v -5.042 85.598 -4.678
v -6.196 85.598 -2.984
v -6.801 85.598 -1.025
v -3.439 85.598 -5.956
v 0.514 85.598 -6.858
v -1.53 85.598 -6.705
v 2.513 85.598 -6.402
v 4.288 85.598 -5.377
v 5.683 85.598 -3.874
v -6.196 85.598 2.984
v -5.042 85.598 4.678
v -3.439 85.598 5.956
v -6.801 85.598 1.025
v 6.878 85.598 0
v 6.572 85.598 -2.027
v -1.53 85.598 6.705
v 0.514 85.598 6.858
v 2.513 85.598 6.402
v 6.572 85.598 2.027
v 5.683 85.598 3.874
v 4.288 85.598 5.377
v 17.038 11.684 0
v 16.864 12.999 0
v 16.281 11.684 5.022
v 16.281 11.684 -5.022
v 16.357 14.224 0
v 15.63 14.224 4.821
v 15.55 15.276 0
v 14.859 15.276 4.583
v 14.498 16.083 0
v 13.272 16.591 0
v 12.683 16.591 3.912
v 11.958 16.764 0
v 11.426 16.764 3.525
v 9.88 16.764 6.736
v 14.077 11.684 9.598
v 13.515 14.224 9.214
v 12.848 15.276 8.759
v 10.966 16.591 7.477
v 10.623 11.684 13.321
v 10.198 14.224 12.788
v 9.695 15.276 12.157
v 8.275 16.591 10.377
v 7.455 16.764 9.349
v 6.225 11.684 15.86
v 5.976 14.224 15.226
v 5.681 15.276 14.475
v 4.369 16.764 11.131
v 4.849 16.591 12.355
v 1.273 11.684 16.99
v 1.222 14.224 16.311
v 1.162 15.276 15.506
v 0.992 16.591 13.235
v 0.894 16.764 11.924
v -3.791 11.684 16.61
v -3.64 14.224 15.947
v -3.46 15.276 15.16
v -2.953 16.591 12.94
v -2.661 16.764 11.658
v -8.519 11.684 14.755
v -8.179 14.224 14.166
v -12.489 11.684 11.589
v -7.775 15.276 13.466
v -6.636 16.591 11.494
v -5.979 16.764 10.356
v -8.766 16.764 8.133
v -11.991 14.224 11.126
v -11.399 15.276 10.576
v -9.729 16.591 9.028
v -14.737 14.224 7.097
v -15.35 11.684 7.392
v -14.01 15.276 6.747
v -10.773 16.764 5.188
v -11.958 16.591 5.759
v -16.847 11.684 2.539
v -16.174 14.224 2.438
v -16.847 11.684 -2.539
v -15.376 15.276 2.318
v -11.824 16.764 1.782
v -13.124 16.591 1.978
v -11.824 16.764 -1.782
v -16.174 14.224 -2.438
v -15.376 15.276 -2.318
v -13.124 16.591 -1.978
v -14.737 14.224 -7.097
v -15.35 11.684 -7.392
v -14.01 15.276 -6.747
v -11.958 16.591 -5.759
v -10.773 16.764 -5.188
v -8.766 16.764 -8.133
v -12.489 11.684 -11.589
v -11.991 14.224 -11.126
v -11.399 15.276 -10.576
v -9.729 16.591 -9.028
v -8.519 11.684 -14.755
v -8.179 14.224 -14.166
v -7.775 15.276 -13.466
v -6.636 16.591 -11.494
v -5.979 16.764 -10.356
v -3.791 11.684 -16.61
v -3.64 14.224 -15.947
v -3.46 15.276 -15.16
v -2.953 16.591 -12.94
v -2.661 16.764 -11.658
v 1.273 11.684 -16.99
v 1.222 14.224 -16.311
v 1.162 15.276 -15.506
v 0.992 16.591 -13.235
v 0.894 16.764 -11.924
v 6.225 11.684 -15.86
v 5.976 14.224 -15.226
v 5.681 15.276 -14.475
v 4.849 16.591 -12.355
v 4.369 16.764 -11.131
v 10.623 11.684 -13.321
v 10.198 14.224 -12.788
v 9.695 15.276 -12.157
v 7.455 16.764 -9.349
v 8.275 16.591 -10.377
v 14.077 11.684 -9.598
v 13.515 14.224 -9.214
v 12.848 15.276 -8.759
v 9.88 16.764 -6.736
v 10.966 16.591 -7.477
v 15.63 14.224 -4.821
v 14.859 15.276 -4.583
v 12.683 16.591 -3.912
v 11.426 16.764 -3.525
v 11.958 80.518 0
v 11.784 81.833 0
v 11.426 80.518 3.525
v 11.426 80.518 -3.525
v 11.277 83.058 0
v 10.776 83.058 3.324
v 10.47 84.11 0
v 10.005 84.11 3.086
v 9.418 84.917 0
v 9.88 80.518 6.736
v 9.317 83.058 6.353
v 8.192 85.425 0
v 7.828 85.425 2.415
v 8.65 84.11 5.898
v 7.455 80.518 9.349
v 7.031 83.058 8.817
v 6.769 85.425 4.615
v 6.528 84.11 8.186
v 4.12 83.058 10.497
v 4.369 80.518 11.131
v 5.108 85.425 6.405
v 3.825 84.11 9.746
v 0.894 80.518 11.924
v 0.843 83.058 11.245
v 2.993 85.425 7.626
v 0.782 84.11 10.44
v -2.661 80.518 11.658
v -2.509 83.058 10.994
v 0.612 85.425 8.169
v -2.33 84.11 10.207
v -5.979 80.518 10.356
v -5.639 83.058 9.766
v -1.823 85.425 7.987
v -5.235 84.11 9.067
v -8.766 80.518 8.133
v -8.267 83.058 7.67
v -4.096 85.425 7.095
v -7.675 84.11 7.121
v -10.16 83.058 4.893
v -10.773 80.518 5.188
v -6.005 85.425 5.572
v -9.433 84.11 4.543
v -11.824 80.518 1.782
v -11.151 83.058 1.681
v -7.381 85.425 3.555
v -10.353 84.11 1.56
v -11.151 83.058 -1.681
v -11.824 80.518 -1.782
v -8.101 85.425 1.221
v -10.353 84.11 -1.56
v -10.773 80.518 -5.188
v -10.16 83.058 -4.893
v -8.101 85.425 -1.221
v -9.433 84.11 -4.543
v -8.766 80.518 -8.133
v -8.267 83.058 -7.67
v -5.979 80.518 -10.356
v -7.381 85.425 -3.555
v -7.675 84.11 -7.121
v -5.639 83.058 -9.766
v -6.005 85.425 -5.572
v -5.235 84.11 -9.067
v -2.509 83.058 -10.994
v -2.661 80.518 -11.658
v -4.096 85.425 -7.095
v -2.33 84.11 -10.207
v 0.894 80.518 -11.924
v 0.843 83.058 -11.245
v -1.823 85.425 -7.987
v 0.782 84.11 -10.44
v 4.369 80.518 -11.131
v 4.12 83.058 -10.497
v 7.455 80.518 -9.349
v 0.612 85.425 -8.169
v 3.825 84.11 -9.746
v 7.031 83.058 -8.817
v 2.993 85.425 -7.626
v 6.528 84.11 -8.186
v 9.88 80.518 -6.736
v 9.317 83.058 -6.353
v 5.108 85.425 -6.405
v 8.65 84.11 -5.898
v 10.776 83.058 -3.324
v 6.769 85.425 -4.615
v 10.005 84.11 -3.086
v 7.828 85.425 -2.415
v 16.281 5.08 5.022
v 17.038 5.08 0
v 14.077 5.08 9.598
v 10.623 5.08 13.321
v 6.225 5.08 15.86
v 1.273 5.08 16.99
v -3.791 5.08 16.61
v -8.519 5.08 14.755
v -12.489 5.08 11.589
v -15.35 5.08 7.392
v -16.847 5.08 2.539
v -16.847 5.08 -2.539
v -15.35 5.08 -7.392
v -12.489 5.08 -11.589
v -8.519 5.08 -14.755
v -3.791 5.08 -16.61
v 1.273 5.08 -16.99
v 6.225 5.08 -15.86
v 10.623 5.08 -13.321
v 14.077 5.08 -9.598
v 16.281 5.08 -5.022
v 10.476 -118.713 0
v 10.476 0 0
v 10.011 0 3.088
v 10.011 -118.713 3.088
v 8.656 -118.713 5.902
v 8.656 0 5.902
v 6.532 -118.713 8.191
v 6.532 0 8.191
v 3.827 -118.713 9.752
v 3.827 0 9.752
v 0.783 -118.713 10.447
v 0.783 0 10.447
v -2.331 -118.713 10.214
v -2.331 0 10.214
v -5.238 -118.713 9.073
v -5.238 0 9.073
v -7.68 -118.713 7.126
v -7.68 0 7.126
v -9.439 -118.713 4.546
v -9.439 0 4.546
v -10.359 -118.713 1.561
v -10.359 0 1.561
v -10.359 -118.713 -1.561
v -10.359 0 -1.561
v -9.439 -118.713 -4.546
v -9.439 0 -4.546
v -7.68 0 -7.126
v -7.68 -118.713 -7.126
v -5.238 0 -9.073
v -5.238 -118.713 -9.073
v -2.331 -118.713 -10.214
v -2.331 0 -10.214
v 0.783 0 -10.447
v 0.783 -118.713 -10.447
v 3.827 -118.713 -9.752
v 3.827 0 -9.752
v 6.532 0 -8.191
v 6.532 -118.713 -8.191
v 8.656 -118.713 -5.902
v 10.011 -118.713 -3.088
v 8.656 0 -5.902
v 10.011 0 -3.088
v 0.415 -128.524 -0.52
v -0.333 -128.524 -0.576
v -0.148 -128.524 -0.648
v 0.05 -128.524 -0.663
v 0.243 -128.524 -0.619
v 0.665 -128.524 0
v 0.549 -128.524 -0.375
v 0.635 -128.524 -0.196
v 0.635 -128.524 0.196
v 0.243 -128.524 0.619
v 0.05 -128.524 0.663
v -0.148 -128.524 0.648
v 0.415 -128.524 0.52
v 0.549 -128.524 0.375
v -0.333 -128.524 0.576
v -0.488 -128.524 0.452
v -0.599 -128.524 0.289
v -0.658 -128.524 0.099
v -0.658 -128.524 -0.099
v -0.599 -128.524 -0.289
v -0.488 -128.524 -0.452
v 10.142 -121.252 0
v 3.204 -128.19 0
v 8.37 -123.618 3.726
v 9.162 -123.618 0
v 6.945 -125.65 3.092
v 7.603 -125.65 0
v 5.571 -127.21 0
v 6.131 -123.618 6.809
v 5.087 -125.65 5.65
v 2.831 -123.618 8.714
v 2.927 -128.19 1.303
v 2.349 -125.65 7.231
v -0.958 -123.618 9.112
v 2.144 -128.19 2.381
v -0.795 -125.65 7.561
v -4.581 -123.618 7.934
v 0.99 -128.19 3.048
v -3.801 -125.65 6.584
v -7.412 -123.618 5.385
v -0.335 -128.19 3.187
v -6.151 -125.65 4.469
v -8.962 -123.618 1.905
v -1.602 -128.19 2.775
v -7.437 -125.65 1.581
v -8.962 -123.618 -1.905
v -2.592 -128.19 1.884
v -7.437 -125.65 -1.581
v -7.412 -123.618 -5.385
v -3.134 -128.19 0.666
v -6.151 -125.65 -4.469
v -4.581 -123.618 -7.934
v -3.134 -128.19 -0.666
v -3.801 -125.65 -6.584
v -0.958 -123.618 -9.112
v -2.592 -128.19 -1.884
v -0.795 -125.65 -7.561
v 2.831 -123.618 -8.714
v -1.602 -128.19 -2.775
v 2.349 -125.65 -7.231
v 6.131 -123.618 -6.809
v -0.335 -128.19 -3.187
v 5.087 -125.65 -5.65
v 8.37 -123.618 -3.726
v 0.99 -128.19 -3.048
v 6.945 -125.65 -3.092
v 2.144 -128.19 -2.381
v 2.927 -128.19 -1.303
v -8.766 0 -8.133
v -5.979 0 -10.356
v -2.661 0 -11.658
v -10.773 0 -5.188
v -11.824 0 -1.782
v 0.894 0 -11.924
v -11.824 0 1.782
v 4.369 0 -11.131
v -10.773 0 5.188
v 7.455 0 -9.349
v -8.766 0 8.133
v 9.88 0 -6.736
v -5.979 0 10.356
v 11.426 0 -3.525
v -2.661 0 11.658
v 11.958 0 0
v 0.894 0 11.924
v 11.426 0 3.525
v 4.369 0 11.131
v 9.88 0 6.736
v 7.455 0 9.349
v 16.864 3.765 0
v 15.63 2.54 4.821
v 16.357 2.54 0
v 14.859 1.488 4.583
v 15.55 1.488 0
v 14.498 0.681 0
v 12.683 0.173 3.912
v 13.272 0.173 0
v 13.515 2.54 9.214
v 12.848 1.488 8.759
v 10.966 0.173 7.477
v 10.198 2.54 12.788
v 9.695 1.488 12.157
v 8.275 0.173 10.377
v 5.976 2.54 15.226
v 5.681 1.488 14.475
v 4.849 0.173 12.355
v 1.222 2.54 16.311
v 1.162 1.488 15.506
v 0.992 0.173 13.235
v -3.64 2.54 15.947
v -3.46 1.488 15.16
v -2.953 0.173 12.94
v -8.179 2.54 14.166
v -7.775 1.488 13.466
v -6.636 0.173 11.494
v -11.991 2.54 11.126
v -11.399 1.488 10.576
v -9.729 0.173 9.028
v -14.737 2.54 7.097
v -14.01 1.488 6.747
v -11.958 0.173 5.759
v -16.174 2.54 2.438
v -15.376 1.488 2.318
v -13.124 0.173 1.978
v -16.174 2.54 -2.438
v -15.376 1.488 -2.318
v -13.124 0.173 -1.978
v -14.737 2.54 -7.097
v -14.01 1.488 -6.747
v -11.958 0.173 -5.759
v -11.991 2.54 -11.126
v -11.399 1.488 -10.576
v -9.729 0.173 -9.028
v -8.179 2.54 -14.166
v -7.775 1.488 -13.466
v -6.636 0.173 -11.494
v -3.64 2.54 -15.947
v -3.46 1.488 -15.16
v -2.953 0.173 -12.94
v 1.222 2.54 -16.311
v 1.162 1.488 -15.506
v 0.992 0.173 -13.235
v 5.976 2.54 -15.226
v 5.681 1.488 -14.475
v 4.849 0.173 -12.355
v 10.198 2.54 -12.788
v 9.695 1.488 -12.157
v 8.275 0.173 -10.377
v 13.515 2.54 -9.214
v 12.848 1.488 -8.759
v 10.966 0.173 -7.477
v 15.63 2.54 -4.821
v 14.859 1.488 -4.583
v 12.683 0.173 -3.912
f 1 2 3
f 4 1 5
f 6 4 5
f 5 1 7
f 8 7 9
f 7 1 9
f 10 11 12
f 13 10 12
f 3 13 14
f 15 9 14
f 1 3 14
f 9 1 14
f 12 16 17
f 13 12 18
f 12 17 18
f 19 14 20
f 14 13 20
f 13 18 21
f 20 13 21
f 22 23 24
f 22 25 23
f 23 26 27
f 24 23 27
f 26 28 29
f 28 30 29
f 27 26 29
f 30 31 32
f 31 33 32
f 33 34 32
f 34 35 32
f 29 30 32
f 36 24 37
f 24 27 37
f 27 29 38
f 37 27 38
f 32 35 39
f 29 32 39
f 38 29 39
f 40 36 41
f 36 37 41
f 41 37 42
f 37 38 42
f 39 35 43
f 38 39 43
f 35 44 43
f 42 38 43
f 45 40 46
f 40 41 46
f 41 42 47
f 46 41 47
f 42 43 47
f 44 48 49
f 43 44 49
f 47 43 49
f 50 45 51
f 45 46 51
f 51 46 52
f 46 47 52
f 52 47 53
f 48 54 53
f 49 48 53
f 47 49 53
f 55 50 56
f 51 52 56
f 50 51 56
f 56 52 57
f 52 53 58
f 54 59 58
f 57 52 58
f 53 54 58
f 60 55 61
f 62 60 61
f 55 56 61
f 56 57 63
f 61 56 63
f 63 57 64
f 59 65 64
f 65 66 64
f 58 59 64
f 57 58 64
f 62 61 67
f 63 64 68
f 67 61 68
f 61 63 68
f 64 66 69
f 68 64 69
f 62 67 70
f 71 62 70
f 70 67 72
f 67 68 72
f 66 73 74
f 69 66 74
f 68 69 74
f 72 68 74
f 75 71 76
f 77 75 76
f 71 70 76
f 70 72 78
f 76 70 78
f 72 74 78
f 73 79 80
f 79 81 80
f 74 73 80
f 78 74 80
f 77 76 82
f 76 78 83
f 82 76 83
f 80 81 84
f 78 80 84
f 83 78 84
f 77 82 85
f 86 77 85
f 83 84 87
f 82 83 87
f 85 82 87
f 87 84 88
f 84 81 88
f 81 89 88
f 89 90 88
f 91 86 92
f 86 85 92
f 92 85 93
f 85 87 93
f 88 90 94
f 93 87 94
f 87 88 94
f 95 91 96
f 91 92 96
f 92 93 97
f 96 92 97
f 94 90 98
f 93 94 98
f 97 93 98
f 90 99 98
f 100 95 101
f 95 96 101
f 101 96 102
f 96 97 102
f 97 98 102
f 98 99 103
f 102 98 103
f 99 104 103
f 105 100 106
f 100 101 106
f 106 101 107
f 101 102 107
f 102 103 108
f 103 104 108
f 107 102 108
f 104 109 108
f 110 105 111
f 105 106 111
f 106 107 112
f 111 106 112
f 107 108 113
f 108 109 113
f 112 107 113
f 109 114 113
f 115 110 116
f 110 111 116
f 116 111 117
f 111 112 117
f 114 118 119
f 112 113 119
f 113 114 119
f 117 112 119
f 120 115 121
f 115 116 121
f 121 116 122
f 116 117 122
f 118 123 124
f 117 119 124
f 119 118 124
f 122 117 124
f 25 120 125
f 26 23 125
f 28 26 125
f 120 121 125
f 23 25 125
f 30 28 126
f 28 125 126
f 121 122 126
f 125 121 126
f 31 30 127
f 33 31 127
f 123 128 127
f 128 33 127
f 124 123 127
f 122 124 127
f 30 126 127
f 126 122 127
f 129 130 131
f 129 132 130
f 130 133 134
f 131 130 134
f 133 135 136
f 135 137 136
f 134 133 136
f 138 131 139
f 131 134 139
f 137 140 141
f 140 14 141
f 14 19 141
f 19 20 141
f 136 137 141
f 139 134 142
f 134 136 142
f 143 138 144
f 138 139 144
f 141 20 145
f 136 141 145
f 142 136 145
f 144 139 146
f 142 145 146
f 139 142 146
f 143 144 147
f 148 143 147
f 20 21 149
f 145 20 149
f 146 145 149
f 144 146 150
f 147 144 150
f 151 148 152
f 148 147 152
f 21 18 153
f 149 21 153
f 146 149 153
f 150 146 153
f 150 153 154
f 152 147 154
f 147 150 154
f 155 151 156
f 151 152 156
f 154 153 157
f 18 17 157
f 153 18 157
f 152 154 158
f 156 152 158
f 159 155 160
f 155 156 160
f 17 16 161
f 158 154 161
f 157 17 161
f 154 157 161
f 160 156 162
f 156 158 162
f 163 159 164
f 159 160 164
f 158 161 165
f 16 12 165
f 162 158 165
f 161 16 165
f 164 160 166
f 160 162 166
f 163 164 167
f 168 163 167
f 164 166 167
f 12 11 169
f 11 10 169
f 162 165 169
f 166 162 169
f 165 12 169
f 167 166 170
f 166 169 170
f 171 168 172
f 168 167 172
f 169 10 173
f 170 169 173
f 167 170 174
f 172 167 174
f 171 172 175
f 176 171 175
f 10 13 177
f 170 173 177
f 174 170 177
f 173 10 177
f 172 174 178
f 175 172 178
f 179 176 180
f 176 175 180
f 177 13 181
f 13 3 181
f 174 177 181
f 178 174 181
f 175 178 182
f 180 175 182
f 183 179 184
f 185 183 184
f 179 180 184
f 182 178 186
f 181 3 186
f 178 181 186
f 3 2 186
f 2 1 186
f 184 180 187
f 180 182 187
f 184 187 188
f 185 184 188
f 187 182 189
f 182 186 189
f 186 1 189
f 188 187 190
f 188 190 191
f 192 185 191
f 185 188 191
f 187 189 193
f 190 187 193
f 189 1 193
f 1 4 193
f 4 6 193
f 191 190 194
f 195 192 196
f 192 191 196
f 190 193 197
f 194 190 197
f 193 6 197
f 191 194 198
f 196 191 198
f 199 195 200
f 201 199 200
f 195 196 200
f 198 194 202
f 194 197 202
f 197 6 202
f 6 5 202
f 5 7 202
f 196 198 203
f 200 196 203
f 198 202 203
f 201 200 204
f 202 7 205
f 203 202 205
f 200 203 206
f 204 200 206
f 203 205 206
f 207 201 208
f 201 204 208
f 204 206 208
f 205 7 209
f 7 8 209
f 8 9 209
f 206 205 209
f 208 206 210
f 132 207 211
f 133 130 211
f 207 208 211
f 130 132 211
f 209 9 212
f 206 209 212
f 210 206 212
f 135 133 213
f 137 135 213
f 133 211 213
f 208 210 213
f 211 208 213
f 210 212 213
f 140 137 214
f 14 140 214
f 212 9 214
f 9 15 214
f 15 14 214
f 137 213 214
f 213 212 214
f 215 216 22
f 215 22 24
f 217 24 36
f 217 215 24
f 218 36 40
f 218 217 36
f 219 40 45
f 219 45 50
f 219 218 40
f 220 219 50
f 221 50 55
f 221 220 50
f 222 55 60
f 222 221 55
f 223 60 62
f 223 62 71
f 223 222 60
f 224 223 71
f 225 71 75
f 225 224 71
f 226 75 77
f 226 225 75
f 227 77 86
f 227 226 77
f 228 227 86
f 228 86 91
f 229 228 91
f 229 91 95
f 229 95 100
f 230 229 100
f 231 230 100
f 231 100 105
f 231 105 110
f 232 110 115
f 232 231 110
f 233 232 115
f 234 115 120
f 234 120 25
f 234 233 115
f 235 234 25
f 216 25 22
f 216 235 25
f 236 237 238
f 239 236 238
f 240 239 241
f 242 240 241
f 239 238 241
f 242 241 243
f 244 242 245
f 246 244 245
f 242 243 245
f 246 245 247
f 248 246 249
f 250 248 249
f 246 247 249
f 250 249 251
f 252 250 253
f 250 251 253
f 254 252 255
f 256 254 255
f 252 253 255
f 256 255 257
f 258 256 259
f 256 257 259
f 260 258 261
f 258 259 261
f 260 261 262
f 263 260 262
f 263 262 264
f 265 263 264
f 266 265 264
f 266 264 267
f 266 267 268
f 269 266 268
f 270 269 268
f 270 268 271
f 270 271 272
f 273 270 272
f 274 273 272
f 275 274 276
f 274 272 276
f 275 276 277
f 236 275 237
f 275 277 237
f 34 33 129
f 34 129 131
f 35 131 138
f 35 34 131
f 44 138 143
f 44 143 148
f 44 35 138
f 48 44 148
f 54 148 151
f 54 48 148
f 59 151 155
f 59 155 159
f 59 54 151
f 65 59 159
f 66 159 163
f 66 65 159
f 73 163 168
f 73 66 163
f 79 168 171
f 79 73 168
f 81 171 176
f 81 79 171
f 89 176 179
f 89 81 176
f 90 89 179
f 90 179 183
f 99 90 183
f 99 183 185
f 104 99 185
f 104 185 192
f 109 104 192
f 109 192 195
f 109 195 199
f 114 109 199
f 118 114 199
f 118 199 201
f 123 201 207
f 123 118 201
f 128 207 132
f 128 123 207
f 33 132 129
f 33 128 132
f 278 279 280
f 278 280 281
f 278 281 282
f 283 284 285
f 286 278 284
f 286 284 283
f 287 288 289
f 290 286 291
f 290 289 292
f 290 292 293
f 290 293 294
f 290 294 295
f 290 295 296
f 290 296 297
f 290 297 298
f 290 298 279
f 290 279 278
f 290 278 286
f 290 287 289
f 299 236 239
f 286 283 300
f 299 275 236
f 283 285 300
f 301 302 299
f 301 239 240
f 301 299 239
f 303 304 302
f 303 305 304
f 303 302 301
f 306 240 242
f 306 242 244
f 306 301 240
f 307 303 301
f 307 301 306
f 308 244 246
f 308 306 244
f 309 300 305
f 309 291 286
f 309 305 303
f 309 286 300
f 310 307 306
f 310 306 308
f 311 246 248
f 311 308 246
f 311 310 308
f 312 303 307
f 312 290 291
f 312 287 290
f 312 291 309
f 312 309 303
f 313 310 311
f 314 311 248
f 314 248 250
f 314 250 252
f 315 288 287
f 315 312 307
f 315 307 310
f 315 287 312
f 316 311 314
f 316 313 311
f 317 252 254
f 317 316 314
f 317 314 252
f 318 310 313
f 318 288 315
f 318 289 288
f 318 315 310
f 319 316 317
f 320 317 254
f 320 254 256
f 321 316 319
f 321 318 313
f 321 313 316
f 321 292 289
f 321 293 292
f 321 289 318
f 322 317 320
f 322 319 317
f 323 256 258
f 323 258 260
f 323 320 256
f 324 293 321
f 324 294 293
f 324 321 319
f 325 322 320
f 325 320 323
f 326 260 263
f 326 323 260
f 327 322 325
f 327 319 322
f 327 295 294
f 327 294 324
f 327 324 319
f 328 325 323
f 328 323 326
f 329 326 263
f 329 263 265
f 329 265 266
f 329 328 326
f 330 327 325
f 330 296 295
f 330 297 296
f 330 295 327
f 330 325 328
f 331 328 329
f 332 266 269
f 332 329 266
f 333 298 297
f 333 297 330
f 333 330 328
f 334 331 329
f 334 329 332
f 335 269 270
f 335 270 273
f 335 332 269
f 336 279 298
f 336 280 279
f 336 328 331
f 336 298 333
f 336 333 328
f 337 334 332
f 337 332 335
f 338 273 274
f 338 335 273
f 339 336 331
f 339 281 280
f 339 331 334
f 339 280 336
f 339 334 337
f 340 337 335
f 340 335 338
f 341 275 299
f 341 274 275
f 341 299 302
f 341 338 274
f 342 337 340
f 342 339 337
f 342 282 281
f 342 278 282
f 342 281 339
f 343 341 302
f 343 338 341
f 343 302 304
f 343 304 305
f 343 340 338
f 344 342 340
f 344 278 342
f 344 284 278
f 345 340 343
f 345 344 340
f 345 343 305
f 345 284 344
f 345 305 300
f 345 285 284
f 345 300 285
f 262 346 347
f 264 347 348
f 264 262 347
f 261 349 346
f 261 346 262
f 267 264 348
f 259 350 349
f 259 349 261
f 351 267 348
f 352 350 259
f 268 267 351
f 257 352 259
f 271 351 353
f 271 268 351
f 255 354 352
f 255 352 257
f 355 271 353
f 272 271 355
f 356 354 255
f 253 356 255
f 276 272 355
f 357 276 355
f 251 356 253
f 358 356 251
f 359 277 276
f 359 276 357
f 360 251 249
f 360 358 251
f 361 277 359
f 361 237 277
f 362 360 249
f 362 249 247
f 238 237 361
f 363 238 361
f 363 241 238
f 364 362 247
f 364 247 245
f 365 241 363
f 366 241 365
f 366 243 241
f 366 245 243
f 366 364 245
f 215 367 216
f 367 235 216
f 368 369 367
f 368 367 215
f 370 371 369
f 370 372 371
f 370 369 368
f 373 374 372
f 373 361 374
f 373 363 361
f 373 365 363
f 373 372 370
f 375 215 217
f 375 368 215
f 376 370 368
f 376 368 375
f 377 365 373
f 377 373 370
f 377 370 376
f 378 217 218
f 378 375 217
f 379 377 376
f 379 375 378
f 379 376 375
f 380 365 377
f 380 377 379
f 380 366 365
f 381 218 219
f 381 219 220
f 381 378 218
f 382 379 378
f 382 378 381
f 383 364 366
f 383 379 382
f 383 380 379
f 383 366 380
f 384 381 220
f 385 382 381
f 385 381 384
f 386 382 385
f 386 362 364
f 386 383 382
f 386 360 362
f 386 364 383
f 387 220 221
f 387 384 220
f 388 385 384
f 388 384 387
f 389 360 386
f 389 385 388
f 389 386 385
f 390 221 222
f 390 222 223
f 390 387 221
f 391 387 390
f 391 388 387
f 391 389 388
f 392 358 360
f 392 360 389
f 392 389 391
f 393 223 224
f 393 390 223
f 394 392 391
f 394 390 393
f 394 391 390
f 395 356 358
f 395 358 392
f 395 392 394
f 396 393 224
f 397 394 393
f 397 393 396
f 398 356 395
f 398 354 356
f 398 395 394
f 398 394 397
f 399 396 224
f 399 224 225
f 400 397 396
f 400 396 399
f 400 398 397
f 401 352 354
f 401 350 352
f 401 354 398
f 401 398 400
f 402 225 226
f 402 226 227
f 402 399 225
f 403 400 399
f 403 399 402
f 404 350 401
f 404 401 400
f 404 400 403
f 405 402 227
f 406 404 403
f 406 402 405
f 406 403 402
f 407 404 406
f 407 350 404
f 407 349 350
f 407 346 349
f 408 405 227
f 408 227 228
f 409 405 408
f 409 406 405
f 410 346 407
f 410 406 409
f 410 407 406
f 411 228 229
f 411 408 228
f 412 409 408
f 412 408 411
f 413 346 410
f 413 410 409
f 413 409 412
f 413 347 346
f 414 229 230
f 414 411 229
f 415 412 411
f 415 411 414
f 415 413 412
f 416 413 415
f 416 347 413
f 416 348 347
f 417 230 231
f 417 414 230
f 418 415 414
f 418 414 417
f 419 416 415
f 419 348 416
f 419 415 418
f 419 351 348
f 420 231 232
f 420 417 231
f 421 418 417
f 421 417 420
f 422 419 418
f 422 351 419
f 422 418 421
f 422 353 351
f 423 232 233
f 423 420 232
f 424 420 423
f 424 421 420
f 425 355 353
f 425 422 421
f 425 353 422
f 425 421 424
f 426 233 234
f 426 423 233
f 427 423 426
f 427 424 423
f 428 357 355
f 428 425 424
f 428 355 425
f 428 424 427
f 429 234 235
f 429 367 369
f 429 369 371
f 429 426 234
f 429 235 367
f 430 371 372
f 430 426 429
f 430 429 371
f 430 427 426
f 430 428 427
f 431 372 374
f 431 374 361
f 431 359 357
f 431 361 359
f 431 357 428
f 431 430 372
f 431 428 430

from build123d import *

# Parameters (mm, degrees)
F0_R     = 10.4764033566
F1_DEPTH = 128.524
F2_R     = 9.8113639175
F3_R     = 17.037591744
F4_DEPTH = 16.764
F5_R     = 5.08
F6_R     = 5.08
F7_DEPTH = 68.834
F8_R     = 5.08


with BuildPart() as f1:
    # F0 (on Front) → F1 (new body)
    with BuildSketch(Plane.XZ):
        Circle(F0_R)
    extrude(amount=F1_DEPTH)

    # F2
    f2_edges = [f1.edges().sort_by_distance(p)[0] for p in [
        (-10.476403, -128.524, 0),
    ]]
    fillet(f2_edges, radius=F2_R)

    # F3 (on Front) → F4 (join)
    with BuildSketch(Plane.XZ):
        Circle(F3_R)
    extrude(amount=-F4_DEPTH)

    # F5
    f5_edges = [f1.edges().sort_by_distance(p)[0] for p in [
        (-17.037592, 16.764, 0),
    ]]
    fillet(f5_edges, radius=F5_R)

    # F6
    f6_edges = [f1.edges().sort_by_distance(p)[0] for p in [
        (-17.037592, 0, 0),
    ]]
    fillet(f6_edges, radius=F6_R)

    # F7 (add): a face of the model
    f7_faces = [f1.faces().sort_by_distance(p)[0] for p in [
        (0, 16.764, 0),
    ]]
    extrude(f7_faces, amount=F7_DEPTH)

    # F8
    f8_edges = [f1.edges().sort_by_distance(p)[0] for p in [
        (-11.957592, 85.598, 0),
    ]]
    fillet(f8_edges, radius=F8_R)


solid = f1.part
